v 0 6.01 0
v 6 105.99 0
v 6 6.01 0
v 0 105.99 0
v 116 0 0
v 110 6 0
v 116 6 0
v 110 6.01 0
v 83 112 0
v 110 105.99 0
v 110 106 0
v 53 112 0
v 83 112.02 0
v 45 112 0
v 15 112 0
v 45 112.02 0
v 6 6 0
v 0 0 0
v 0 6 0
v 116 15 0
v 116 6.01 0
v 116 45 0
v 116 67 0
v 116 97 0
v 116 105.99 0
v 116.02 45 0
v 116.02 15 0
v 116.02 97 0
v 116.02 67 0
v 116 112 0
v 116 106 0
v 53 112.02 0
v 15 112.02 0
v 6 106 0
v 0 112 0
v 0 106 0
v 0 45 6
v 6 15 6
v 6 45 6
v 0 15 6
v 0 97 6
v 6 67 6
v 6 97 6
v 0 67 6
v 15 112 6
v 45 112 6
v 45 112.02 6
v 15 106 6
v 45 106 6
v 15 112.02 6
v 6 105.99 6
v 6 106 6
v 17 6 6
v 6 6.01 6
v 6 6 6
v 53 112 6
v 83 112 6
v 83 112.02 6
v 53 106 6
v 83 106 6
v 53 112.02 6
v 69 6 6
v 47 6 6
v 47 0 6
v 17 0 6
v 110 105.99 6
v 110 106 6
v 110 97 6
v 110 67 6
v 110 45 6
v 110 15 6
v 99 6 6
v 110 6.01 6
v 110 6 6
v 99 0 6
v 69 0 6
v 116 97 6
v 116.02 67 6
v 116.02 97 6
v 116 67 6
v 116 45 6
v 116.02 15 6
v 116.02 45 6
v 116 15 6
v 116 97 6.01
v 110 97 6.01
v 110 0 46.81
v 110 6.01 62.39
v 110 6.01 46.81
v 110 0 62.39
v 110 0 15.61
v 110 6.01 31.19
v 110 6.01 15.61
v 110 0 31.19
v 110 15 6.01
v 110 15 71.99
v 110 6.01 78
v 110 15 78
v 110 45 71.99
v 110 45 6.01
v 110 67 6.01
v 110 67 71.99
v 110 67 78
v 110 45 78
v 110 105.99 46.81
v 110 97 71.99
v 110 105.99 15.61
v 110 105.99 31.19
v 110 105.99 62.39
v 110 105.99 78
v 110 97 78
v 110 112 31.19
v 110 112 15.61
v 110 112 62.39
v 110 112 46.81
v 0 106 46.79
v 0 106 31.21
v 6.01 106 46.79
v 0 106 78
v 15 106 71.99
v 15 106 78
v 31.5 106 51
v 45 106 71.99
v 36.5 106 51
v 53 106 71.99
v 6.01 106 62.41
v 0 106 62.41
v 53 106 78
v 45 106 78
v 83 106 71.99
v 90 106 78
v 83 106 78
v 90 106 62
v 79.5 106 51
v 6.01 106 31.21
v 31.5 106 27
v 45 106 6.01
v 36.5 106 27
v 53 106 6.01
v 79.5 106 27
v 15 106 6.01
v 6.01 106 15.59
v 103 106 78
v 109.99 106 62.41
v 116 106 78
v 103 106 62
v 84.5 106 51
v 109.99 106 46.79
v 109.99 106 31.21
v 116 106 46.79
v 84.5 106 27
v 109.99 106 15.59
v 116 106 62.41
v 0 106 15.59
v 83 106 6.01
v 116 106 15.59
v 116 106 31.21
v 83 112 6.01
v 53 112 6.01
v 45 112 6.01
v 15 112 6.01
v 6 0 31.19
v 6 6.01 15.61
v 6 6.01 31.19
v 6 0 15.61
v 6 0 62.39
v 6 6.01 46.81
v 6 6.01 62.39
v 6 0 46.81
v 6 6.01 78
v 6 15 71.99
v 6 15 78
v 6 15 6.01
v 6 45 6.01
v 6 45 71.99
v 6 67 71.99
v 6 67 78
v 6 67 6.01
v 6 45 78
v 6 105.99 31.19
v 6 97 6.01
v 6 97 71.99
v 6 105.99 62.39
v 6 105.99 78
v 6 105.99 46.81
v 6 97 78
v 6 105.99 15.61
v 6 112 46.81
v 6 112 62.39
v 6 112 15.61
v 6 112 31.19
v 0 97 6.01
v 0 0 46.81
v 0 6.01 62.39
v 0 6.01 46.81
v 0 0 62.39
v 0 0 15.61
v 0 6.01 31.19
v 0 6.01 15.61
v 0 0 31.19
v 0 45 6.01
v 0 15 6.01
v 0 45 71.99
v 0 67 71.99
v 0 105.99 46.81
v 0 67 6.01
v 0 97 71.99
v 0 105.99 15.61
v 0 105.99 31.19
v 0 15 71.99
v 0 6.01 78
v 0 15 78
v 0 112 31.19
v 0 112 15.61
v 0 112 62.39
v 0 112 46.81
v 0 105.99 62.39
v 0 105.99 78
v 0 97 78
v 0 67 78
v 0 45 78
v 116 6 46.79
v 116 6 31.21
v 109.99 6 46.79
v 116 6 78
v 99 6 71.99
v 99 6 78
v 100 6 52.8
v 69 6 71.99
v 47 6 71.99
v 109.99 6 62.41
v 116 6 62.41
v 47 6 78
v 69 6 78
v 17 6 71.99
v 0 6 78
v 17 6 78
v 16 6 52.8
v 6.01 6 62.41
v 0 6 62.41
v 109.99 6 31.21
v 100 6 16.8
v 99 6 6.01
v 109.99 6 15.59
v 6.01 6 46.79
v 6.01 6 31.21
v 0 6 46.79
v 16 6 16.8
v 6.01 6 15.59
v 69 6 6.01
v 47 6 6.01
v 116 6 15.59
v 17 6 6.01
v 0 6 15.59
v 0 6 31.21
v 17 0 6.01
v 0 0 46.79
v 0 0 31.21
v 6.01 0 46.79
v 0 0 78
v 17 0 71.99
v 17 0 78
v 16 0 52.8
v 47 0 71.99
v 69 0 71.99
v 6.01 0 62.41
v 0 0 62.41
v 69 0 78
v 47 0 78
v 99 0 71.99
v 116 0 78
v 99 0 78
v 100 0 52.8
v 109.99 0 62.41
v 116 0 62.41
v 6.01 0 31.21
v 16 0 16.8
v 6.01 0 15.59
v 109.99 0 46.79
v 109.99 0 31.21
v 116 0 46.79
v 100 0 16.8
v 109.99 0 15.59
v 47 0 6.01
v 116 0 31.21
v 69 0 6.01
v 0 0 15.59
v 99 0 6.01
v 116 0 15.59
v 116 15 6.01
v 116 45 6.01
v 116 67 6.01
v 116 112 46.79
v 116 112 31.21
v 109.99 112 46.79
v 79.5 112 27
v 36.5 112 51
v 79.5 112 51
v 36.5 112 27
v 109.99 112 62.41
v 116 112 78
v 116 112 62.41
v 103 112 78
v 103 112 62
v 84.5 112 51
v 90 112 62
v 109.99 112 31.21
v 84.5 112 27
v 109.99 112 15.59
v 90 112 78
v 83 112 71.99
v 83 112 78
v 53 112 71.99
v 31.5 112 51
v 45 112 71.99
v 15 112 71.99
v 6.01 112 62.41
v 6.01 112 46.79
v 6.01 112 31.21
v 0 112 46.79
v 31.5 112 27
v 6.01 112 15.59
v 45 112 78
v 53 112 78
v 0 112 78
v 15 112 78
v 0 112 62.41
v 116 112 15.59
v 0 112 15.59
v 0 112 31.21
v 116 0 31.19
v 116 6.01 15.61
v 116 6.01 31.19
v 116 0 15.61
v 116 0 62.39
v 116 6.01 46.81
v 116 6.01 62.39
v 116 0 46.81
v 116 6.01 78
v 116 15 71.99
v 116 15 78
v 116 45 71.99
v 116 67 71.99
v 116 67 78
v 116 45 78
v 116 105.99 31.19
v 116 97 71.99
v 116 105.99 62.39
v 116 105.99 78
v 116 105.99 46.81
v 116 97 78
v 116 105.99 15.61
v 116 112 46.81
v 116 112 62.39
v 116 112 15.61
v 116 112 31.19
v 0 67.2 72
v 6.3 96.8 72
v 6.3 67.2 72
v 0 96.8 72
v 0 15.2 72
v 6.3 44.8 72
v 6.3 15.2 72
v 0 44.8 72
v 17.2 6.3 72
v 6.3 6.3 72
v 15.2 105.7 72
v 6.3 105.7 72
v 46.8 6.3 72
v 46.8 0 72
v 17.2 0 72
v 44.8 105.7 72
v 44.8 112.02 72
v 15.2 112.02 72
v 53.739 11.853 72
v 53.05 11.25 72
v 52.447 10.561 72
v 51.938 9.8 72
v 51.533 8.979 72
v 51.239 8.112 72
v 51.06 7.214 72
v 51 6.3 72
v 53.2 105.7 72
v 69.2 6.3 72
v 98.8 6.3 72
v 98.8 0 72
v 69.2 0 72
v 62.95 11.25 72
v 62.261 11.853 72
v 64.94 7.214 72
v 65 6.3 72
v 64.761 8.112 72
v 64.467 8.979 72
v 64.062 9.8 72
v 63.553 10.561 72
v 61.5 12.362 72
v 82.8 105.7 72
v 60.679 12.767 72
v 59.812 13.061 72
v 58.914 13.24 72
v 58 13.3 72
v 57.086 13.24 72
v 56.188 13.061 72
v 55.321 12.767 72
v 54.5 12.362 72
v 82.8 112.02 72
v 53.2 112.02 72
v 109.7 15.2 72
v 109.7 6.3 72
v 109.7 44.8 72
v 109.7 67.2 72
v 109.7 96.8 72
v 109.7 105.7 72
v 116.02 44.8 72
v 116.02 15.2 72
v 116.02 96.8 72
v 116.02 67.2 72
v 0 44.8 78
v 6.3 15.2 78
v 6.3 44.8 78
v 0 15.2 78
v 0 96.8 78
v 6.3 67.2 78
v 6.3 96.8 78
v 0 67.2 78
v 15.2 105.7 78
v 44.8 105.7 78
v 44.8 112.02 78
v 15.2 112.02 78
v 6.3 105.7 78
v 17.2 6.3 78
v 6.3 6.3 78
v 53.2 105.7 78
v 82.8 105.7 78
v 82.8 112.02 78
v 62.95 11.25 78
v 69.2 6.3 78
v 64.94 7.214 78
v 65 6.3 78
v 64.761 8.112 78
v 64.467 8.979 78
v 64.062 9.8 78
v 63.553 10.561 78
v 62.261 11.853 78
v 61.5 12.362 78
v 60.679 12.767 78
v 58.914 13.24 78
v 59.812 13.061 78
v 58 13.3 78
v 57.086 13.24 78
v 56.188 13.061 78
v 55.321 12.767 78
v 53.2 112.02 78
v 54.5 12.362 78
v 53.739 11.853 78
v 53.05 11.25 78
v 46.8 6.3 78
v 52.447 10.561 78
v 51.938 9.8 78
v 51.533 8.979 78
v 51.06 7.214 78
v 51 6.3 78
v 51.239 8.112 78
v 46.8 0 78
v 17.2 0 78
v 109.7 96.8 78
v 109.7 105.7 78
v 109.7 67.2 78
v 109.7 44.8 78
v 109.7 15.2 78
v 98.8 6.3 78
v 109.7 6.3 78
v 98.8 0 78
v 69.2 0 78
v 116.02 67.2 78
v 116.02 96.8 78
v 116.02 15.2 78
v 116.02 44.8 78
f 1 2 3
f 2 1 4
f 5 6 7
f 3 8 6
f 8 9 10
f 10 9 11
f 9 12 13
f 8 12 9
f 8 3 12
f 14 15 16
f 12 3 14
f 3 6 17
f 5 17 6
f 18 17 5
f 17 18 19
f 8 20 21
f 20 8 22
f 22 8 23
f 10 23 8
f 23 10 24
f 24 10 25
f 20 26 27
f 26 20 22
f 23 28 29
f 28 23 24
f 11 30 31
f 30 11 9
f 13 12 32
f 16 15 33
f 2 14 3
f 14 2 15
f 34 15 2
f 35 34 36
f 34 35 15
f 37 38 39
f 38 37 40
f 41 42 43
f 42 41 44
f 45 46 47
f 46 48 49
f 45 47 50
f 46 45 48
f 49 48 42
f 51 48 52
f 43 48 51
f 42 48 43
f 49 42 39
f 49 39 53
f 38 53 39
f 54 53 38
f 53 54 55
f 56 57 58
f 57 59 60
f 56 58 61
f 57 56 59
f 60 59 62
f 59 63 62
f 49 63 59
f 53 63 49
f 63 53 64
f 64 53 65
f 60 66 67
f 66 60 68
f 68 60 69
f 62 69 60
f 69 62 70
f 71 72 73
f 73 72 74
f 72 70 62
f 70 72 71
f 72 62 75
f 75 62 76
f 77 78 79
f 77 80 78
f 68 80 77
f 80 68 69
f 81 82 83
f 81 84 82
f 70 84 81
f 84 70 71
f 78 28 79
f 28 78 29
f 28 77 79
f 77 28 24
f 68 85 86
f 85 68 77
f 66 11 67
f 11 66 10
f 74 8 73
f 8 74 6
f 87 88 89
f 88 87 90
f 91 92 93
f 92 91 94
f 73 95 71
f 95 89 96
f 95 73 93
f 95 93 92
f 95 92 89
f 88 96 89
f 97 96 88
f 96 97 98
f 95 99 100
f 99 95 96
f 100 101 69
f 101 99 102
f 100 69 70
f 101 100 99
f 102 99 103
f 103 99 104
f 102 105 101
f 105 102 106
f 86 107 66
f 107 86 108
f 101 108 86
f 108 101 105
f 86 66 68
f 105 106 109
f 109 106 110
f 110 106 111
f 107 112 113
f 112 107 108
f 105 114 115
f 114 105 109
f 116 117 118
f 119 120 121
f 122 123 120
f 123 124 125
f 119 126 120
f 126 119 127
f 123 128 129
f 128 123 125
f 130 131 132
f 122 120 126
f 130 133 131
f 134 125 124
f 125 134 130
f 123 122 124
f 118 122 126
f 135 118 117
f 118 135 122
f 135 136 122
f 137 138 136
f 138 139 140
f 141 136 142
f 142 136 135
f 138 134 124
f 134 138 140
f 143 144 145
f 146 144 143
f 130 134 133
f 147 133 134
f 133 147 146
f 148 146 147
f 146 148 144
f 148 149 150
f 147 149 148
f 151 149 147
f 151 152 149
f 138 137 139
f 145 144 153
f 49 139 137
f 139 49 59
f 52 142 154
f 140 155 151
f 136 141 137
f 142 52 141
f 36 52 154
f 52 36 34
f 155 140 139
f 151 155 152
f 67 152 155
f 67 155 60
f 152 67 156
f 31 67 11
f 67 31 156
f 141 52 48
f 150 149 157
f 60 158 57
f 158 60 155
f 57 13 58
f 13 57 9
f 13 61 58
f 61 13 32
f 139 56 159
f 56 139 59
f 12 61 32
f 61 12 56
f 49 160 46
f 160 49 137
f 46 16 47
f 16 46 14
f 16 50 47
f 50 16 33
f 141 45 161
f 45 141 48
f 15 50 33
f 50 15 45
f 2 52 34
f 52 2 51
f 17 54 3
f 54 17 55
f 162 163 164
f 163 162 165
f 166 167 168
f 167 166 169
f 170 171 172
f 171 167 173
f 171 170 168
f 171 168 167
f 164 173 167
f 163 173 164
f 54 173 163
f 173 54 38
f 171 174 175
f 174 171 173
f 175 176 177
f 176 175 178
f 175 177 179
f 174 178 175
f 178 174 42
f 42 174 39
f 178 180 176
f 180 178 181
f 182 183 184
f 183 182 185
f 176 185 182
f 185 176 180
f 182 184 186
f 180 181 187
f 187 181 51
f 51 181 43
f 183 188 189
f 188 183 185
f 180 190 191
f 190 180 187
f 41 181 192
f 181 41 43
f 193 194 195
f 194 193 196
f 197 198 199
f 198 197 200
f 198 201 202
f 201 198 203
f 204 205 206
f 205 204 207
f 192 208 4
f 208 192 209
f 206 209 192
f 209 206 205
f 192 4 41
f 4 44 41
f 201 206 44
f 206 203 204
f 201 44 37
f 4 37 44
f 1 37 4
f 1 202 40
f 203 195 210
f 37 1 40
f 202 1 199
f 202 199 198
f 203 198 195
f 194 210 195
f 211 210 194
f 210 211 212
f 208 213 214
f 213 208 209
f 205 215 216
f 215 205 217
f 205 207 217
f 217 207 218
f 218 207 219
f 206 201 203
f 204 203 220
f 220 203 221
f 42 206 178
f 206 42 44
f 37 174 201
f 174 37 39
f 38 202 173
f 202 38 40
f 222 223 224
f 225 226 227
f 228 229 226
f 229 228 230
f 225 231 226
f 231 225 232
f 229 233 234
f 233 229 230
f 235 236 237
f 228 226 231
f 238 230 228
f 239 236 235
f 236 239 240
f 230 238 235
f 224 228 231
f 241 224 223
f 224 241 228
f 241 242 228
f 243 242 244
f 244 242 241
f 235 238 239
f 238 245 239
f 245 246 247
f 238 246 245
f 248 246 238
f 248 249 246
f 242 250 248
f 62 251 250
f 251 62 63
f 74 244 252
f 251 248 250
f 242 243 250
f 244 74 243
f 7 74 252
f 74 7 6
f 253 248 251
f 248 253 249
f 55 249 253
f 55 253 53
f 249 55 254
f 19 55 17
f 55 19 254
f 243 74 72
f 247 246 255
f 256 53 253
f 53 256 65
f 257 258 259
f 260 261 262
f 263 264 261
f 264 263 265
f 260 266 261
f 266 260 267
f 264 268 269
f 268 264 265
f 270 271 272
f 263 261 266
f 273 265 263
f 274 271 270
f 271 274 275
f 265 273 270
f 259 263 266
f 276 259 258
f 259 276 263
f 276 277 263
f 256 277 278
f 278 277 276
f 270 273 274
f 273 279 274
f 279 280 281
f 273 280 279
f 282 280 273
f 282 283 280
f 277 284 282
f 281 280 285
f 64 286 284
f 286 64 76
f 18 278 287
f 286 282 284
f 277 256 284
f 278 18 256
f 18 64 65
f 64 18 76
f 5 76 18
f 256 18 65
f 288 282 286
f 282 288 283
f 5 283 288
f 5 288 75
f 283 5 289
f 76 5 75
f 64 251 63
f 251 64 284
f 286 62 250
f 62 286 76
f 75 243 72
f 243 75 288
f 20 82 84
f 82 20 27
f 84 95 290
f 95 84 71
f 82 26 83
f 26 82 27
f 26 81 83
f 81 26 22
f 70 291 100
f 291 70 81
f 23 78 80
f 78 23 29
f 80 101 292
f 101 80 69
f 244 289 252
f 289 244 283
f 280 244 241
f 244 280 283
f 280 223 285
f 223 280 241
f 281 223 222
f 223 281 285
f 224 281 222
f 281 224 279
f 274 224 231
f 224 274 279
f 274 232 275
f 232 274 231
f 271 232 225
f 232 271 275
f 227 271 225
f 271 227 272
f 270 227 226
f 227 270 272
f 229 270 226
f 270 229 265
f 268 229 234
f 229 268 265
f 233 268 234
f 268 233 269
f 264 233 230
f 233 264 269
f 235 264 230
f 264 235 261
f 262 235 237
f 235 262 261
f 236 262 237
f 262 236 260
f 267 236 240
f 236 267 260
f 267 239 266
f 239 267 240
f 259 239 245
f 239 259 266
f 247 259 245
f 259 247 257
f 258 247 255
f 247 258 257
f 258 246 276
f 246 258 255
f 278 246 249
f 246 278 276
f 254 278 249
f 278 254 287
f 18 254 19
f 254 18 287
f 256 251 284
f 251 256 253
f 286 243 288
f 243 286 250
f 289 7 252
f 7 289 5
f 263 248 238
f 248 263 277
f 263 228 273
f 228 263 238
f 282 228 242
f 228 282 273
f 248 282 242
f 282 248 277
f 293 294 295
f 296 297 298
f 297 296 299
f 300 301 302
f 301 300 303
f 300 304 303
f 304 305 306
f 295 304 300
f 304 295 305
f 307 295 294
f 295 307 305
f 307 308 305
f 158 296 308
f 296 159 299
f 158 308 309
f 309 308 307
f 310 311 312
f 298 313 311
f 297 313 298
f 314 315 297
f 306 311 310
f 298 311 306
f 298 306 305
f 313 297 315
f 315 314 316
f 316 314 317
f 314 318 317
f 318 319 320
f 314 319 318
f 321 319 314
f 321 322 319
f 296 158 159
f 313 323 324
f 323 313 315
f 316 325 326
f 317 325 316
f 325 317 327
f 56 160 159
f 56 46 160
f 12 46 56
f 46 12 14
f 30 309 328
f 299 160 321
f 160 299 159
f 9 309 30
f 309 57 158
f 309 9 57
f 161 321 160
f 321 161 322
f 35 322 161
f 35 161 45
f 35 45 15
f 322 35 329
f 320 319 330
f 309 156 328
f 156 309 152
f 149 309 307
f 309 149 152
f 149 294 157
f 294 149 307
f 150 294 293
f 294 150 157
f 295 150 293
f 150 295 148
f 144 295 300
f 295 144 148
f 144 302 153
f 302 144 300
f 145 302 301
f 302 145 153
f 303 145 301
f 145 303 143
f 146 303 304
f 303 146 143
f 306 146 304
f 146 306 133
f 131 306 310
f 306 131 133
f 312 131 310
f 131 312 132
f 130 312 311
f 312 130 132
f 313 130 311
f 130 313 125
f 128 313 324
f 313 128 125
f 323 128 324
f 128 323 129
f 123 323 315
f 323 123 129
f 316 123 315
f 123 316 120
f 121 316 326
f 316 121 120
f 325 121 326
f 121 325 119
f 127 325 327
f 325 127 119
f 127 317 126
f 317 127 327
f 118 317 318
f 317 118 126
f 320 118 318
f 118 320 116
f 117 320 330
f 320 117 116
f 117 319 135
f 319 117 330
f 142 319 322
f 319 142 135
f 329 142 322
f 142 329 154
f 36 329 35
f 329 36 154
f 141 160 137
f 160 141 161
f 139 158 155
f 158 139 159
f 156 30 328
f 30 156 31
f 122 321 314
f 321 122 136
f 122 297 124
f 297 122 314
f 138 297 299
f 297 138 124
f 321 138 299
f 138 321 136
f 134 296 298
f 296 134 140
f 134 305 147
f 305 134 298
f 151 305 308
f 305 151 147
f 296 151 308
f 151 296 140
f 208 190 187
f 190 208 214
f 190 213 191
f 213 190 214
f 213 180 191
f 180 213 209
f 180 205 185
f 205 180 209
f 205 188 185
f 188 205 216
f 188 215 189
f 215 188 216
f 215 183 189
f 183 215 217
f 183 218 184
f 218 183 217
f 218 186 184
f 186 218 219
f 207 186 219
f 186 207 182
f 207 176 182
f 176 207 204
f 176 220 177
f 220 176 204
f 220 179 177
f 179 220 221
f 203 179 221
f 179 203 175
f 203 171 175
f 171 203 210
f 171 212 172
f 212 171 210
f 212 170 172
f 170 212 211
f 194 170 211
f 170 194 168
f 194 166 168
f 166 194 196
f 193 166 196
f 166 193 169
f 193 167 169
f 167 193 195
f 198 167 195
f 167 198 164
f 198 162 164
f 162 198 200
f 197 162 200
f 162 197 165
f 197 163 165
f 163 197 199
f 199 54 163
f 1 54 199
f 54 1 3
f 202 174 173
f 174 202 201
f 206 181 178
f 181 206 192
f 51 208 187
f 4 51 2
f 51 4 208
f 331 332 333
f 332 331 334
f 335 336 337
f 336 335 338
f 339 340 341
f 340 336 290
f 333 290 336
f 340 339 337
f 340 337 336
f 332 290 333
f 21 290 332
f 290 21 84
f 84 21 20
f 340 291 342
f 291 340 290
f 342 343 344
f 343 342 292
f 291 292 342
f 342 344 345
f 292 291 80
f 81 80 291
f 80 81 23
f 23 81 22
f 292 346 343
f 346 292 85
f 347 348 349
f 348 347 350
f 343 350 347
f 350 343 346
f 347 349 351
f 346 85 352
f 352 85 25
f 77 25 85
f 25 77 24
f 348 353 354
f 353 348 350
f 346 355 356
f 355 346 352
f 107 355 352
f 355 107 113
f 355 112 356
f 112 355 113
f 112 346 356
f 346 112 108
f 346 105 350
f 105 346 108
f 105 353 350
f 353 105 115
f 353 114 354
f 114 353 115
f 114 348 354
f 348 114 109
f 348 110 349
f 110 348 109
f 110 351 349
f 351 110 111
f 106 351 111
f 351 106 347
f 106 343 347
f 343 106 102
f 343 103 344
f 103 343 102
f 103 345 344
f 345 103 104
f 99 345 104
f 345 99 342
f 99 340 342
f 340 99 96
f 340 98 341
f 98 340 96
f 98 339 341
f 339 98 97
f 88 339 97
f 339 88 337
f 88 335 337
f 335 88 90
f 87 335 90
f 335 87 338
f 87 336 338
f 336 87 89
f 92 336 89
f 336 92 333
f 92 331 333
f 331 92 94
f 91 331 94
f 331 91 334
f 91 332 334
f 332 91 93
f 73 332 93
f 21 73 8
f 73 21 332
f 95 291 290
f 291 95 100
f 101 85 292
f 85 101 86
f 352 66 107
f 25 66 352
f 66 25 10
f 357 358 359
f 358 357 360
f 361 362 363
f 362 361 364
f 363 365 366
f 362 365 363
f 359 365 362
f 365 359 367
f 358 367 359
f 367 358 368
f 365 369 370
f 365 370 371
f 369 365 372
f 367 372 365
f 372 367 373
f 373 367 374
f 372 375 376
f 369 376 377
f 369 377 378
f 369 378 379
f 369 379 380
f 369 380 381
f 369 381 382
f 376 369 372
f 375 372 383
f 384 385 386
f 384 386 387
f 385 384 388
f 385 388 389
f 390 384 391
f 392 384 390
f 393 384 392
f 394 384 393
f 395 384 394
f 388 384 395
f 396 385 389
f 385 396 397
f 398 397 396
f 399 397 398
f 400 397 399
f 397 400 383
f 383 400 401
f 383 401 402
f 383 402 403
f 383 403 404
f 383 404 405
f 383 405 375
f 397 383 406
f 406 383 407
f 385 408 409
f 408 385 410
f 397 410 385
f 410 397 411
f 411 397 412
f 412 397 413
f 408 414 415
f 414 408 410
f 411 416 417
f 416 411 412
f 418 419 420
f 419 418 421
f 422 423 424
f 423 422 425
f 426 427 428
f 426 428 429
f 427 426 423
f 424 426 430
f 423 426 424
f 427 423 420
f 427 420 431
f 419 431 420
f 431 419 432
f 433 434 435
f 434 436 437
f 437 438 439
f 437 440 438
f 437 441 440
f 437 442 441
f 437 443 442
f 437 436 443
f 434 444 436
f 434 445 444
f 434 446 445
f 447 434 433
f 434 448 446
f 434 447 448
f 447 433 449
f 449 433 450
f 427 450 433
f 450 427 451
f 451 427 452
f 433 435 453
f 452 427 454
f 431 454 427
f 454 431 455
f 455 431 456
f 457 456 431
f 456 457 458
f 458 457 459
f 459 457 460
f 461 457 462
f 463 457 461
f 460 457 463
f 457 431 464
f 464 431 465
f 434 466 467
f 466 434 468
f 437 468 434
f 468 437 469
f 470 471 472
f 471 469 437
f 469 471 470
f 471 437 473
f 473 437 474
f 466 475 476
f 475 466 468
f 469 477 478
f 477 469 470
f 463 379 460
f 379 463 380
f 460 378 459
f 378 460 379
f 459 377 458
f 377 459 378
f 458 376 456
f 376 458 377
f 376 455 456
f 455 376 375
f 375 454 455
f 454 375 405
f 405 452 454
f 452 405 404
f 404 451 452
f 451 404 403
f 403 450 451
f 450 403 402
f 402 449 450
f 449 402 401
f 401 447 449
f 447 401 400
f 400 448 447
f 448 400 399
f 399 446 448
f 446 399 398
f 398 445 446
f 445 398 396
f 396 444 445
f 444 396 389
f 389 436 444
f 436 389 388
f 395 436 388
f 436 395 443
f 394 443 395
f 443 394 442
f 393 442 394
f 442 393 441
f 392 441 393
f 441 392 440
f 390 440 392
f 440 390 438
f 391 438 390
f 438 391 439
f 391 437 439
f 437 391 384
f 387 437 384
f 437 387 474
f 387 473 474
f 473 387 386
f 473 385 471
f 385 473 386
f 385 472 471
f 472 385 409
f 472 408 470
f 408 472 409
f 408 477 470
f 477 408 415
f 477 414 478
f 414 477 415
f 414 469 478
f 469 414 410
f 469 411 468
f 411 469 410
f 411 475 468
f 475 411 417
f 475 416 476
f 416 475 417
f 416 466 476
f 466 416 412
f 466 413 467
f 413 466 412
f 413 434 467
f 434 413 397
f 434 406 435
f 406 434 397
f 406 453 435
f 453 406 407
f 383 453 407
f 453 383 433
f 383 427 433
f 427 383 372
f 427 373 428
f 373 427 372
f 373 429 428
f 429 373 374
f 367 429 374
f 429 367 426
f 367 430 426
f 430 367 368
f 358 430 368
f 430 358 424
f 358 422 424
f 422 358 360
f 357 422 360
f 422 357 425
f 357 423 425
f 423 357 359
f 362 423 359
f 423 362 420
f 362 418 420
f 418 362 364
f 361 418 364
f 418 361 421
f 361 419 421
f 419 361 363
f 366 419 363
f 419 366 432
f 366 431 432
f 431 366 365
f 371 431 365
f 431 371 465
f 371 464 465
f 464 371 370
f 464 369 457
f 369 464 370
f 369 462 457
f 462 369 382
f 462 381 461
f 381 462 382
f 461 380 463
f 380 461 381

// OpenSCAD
// Photo Bomb room device enclosures — TWO laser-cut boxes from one file:
//   box = "camera"   Logitech C930e webcam box (strap to the back-plane scaffold,
//                    lens out the front aperture toward the poser/street face)
//   box = "printer"  Brother QL-820NWB label printer box (photo souvenir prints;
//                    open front frames the label slot + LCD + buttons)
//
// Same grammar as node-enclosure.scad: 6 finger-jointed ply panels glued up
// (walls corner-joined, floor tabs mortise through wall-bottom notches, flush
// outside), drop-in lid (floor-twin, tabs land in top notches on all four
// walls, Ø14 finger notch at the front edge), velcro strap slots in the back
// wall for 20mm one-wrap around scaffold tube, NO fastener holes anywhere —
// parts are their own jigs. Stock is 6mm ply (t below = nominal; CALIPER the
// real sheet and re-export before burning).
//
// Device sources (2026-08-08 lookups):
//   QL-820NWB: 125.3 W x 234 D x 145 H mm, 1.16 kg (Brother US spec page);
//     external AC adapter PA-AD-001A (25V DC in) — brick stays OUTSIDE the box;
//     LCD + buttons + label slot all on the sloped FRONT face, all connectors
//     (DC / USB-B / LAN / USB host) on the REAR face, roll cover lifts from the
//     front top (QL-810W/820NWB Quick Setup Guide "Parts Description").
//   C930e: body 94 x 29 x 24, ON FOLDED CLIP 94 W x 43.3 H x 71 D, 162 g,
//     fixed 1.5 m USB-A cable, 90 deg diagonal FOV (Logitech datasheet).
//     1/4-20 tripod thread in the clip foot: sit the camera in its etched
//     floor zone, mark the thread, drill Ø7, bolt from below (no pre-cut hole
//     — same drill-from-the-real-part rule as the DB9 screwlocks).
//
// part = "assembly" | "sheet" | "sheet_etch"
// Etch faces at glue-up (all panels are non-chiral — no pre-mirroring needed):
//   floor UP, front OUT, back OUT, lid UP. Label side out and up.

part = "assembly";
box  = "camera";           // "camera" | "printer"

t    = 6.0;                // ply thickness — caliper the real 6mm sheet
play = 0.3;                // lid drop-in clearance per side
tabslack = 0.4;            // lid tab length reduction vs its notch

// ---------------- device dims (measured/spec'd, see header) ----------------
cam_w = 94;    cam_d = 71;    cam_h = 43.3;   // C930e on folded clip
cam_lens_z = 28.8;                            // lens center above clip foot
prn_w = 125.3; prn_d = 234;   prn_h = 145;    // QL-820NWB
dev_gap_front = 4;                            // device face setback from wall

// ---------------- interiors ----------------
iw = box == "printer" ? 134 : 104;   // width  (device + side clearance)
id = box == "printer" ? 280 : 100;   // depth  (device + front gap + rear cable room:
                                     //  printer 42mm for the DC barrel plug + bend,
                                     //  camera 25mm for the fixed USB-A tail)
ih = box == "printer" ? 155 : 66;    // height (printer +10 headroom; camera clears
                                     //  the flipped-up privacy shade)

W  = iw + 2*t;                       // outer width
D  = id + 2*t;                       // outer depth
Hw = ih + 2*t;                       // wall height = outer height

// ---------------- corner joints ----------------
// nseg vertical segments per corner; front/back walls own the EVEN segs
// (material runs to the outer corner), side walls own the ODD segs.
nseg = box == "printer" ? 7 : 5;
seg  = Hw / nseg;

// ---------------- floor / lid tab positions (centers along the edge) ------
// Front and back edges use different centers on purpose: the floor and lid
// only seat one way (poka-yoke), and the back top edge keeps clear lanes for
// the cable notches between tabs.
tab_len   = 30;
ftab_cx   = box == "printer" ? [W/2-33, W/2+33]      : [W/2-26, W/2+26];
btab_cx   = box == "printer" ? [W/2-44, W/2+44]      : [W/2-28, W/2+10];
stab_cy   = box == "printer" ? [D/2-100, D/2, D/2+100] : [D/2-26, D/2+26];
stab_len  = box == "printer" ? 40 : 30;
finger_d  = 14;                      // lid finger-pull notch diameter

// ---------------- front opening ----------------
// camera: lens aperture. printer: LABEL MOUTH only — the wall stays solid over
// the LCD/buttons/cover (rev 2026-08-08, Tim: "doesn't need a window, it needs
// a spot for the print jobs to come out"). Mouth spans the output tray. Two
// independent measurements agree (product photos scaled to the 125.3 body
// width, AND Tim's photogrammetry scan in ~/printer-test — scale fixed by the
// 145 height, cross-validated by the tray width landing at 107.6 vs the photo
// band 106..109): cutter/slot shelf 74..87 above the feet, ramp bottom 42..48
// (photo only — the black ramp didn't scan), button row bottom ~100..109,
// tray 106..109 wide. Mouth 24..96 x 116 clears the tray on every band and
// keeps the buttons covered. Cut labels slide down the ramp, out the mouth.
ap_w = box == "printer" ? 116 : 84;
ap_z0 = box == "printer" ? t + 24  : t + cam_lens_z - 18;  // bottom (panel coords)
ap_z1 = box == "printer" ? t + 96  : t + cam_lens_z + 18;  // top

// printer status-LED peep: LED ~43 left of center; height band 106..118
// across both measurements -> Ø12 centered 112 covers it (green/red shows
// through; box stays closed to check health)
led_peep_d = 12;
led_x = W/2 - 43;
led_z = t + 112;

// ---------------- back wall features ----------------
vs_w = 5; vs_h = 24; vs_dx = 24;     // velcro slots: 5x24, pair spans a 43mm tube
// cable notches down from the top edge (cables leave over the top-back, the
// lid caps the channel): [center x, width, depth]
notches = box == "printer"
  ? [[60, 13, 20], [86, 13, 20]]     // PWR (DC barrel) | DATA (USB-B / LAN)
  : [[W/2+38.5, 13, 16]];            // USB (12mm USB-A plug head passes)
notch_lbl = box == "printer" ? ["PWR", "DATA"] : ["USB"];

// ---------------- side vents (printer only) ----------------
vent_n = 5; vent_l = 60; vent_h = 5; vent_pitch = 10;
vent_z0 = 110;                       // first slat bottom (panel coords)

// ---------------- 2D helpers ----------------
module corner_notches(width, even) {
  // notch the vertical edges of a panel at the segs it does NOT own
  for (i = [0:nseg-1])
    for (x0 = [0, width - t])
      if (even ? i % 2 == 1 : i % 2 == 0)
        translate([x0 - 0.01, i*seg - 0.01])
          square([t + 0.02, seg + 0.02]);
}

module edge_slots(centers, len, y0, deep) {
  // rectangular cuts of size len x deep with bottom edge at y0
  for (cx = centers)
    translate([cx - len/2, y0 - 0.01]) square([len, deep + 0.02]);
}

// ---------------- wall panels (2D) ----------------
module panel_front_2d() {
  difference() {
    square([W, Hw]);
    corner_notches(W, true);
    edge_slots(ftab_cx, tab_len, 0, t);          // floor mortises
    edge_slots(ftab_cx, tab_len, Hw - t, t);     // lid notches
    translate([(W - ap_w)/2, ap_z0]) square([ap_w, ap_z1 - ap_z0]);
    if (box == "printer") translate([led_x, led_z]) circle(d = led_peep_d, $fn = 40);
  }
}

module panel_back_2d() {
  difference() {
    square([W, Hw]);
    corner_notches(W, true);
    edge_slots(btab_cx, tab_len, 0, t);
    edge_slots(btab_cx, tab_len, Hw - t, t);
    // velcro strap slots
    if (box == "printer") {
      for (zc = [49, 118]) for (s = [-1, 1])
        translate([W/2 + s*vs_dx - vs_w/2, zc - vs_h/2]) square([vs_w, vs_h]);
    } else {
      for (s = [-1, 1])
        translate([W/2 + s*vs_dx - vs_w/2, Hw/2 - vs_h/2]) square([vs_w, vs_h]);
    }
    // cable notches from the top edge
    for (n = notches)
      translate([n[0] - n[1]/2, Hw - n[2]]) square([n[1], n[2] + 0.02]);
  }
}

module panel_side_2d() {                     // left/right: own ODD segs
  difference() {
    square([D, Hw]);
    corner_notches(D, false);
    edge_slots(stab_cy, stab_len, 0, t);
    edge_slots(stab_cy, stab_len, Hw - t, t);
    if (box == "printer")
      for (i = [0:vent_n-1])
        translate([D/2 - vent_l/2, vent_z0 + i*vent_pitch])
          square([vent_l, vent_h]);
  }
}

// ---------------- floor + lid (2D) ----------------
module plate_2d(shrink, tabshrink) {
  // core (iw x id) minus shrink per side, plus edge tabs reaching the outer
  // face through the wall notches
  union() {
    translate([t + shrink, t + shrink])
      square([iw - 2*shrink, id - 2*shrink]);
    for (cx = ftab_cx)                                     // front edge (y=0)
      translate([cx - (tab_len - tabshrink)/2, 0])
        square([tab_len - tabshrink, t + shrink + 0.02]);
    for (cx = btab_cx)                                     // back edge
      translate([cx - (tab_len - tabshrink)/2, D - t - shrink])
        square([tab_len - tabshrink, t + shrink + 0.02]);
    for (cy = stab_cy) for (x0 = [0, W - t - shrink])      // side edges
      translate([x0, cy - (stab_len - tabshrink)/2])
        square([t + shrink + 0.02, stab_len - tabshrink]);
  }
}

module panel_floor_2d() { plate_2d(0, 0); }

module panel_lid_2d() {
  difference() {
    plate_2d(play, tabslack);
    // finger-pull: half-moon into the lid's front core edge, over the front
    // wall's solid top center — reach in and lift
    translate([W/2, t + play]) circle(d = finger_d, $fn = 48);
  }
}

// ---------------- etch layers (2D, same frames as the cut panels) ----------
lbl = 5;          // label text size
fnt = "DejaVu Sans:style=Bold";

module etch_front_2d() {
  txt = box == "printer" ? "PHOTO BOMB PRINTER" : "PHOTO BOMB CAM";
  tz = box == "printer" ? 138 : ap_z1 + 4;   // printer: on the solid upper field
  translate([W/2, tz]) text(txt, size = lbl, halign = "center", font = fnt);
  if (box == "printer")
    translate([led_x, led_z + led_peep_d/2 + 2])
      text("LED", size = lbl - 1, halign = "center", font = fnt);
}

module etch_back_2d() {
  vz = box == "printer" ? 84 : Hw/2;   // between the slot pair(s)
  translate([W/2, vz - lbl/2]) text("VELCRO", size = lbl, halign = "center", font = fnt);
  for (i = [0:len(notches)-1])
    translate([notches[i][0], Hw - notches[i][2] - lbl - 2])
      text(notch_lbl[i], size = lbl - 1, halign = "center", font = fnt);
}

module etch_floor_2d() {
  // device footprint zone, front edge dev_gap_front behind the front wall's
  // inner face; drawn as a 1mm band so it scores as a visible outline
  zw = box == "printer" ? prn_w : cam_w;
  zd = box == "printer" ? prn_d : cam_d;
  translate([W/2 - zw/2, t + dev_gap_front]) difference() {
    square([zw, zd]);
    translate([1, 1]) square([zw - 2, zd - 2]);
  }
  translate([W/2, t + dev_gap_front + zd/2])
    text(box == "printer" ? "QL-820NWB" : "C930e", size = lbl,
         halign = "center", valign = "center", font = fnt);
  translate([W/2, t + dev_gap_front + 4])
    text("FRONT", size = 3, halign = "center", font = fnt);
}

// ---------------- flat sheet ----------------
// Rows are grouped so each row fits a ~430x390 bed load on its own:
//   camera:  one load (~236 x 276 total)
//   printer: row 1 floor+lid (296x292), rows 2+3 left+right (292x338),
//            row 4 front+back (296x167) — select per-row in XCS if the whole
//            sheet exceeds the bed.
gap = 4;
module sheet_cut() {
  if (box == "printer") {
    translate([0, 0])                        panel_floor_2d();
    translate([W + gap, 0])                  panel_lid_2d();
    translate([0, D + gap])                  panel_side_2d();       // left
    translate([0, D + gap + Hw + gap])       panel_side_2d();       // right
    translate([0, D + 2*(Hw + gap) + gap])       panel_front_2d();
    translate([W + gap, D + 2*(Hw + gap) + gap]) panel_back_2d();
  } else {
    translate([0, 0])                        panel_floor_2d();
    translate([W + gap, 0])                  panel_lid_2d();
    translate([0, D + gap])                  panel_front_2d();
    translate([W + gap, D + gap])            panel_back_2d();
    translate([0, D + gap + Hw + gap])       panel_side_2d();       // left
    translate([D + gap, D + gap + Hw + gap]) panel_side_2d();       // right
  }
}

module sheet_etch() {
  if (box == "printer") {
    translate([0, 0])                            etch_floor_2d();
    translate([0, D + 2*(Hw + gap) + gap])       etch_front_2d();
    translate([W + gap, D + 2*(Hw + gap) + gap]) etch_back_2d();
  } else {
    translate([0, 0])                        etch_floor_2d();
    translate([0, D + gap])                  etch_front_2d();
    translate([W + gap, D + gap])            etch_back_2d();
  }
}

// ---------------- assembly preview ----------------
module assembly() {
  color("BurlyWood") linear_extrude(t) panel_floor_2d();
  // front wall: panel x -> world x, panel y -> world z, occupies y 0..t
  color("Peru") rotate([90, 0, 0]) translate([0, 0, -t])
    linear_extrude(t) panel_front_2d();
  // back wall: occupies y D-t..D
  color("Peru") translate([0, D, 0]) rotate([90, 0, 0])
    linear_extrude(t) panel_back_2d();
  // side walls: extrusion maps to +X; left needs no x-translate
  color("Tan") rotate([90, 0, 90]) linear_extrude(t) panel_side_2d();
  color("Tan") translate([W - t, 0, 0]) rotate([90, 0, 90])
    linear_extrude(t) panel_side_2d();
  color("BurlyWood") translate([0, 0, Hw - t]) linear_extrude(t) panel_lid_2d();
  // ghost device for the eyeball fit-check
  %if (box == "printer")
    translate([W/2 - prn_w/2, t + dev_gap_front, t]) cube([prn_w, prn_d, prn_h]);
  else
    translate([W/2 - cam_w/2, t + dev_gap_front, t]) cube([cam_w, cam_d, cam_h]);
}

// ---------------- part switch ----------------
if (part == "sheet")           sheet_cut();
else if (part == "sheet_etch") sheet_etch();
else                           assembly();
